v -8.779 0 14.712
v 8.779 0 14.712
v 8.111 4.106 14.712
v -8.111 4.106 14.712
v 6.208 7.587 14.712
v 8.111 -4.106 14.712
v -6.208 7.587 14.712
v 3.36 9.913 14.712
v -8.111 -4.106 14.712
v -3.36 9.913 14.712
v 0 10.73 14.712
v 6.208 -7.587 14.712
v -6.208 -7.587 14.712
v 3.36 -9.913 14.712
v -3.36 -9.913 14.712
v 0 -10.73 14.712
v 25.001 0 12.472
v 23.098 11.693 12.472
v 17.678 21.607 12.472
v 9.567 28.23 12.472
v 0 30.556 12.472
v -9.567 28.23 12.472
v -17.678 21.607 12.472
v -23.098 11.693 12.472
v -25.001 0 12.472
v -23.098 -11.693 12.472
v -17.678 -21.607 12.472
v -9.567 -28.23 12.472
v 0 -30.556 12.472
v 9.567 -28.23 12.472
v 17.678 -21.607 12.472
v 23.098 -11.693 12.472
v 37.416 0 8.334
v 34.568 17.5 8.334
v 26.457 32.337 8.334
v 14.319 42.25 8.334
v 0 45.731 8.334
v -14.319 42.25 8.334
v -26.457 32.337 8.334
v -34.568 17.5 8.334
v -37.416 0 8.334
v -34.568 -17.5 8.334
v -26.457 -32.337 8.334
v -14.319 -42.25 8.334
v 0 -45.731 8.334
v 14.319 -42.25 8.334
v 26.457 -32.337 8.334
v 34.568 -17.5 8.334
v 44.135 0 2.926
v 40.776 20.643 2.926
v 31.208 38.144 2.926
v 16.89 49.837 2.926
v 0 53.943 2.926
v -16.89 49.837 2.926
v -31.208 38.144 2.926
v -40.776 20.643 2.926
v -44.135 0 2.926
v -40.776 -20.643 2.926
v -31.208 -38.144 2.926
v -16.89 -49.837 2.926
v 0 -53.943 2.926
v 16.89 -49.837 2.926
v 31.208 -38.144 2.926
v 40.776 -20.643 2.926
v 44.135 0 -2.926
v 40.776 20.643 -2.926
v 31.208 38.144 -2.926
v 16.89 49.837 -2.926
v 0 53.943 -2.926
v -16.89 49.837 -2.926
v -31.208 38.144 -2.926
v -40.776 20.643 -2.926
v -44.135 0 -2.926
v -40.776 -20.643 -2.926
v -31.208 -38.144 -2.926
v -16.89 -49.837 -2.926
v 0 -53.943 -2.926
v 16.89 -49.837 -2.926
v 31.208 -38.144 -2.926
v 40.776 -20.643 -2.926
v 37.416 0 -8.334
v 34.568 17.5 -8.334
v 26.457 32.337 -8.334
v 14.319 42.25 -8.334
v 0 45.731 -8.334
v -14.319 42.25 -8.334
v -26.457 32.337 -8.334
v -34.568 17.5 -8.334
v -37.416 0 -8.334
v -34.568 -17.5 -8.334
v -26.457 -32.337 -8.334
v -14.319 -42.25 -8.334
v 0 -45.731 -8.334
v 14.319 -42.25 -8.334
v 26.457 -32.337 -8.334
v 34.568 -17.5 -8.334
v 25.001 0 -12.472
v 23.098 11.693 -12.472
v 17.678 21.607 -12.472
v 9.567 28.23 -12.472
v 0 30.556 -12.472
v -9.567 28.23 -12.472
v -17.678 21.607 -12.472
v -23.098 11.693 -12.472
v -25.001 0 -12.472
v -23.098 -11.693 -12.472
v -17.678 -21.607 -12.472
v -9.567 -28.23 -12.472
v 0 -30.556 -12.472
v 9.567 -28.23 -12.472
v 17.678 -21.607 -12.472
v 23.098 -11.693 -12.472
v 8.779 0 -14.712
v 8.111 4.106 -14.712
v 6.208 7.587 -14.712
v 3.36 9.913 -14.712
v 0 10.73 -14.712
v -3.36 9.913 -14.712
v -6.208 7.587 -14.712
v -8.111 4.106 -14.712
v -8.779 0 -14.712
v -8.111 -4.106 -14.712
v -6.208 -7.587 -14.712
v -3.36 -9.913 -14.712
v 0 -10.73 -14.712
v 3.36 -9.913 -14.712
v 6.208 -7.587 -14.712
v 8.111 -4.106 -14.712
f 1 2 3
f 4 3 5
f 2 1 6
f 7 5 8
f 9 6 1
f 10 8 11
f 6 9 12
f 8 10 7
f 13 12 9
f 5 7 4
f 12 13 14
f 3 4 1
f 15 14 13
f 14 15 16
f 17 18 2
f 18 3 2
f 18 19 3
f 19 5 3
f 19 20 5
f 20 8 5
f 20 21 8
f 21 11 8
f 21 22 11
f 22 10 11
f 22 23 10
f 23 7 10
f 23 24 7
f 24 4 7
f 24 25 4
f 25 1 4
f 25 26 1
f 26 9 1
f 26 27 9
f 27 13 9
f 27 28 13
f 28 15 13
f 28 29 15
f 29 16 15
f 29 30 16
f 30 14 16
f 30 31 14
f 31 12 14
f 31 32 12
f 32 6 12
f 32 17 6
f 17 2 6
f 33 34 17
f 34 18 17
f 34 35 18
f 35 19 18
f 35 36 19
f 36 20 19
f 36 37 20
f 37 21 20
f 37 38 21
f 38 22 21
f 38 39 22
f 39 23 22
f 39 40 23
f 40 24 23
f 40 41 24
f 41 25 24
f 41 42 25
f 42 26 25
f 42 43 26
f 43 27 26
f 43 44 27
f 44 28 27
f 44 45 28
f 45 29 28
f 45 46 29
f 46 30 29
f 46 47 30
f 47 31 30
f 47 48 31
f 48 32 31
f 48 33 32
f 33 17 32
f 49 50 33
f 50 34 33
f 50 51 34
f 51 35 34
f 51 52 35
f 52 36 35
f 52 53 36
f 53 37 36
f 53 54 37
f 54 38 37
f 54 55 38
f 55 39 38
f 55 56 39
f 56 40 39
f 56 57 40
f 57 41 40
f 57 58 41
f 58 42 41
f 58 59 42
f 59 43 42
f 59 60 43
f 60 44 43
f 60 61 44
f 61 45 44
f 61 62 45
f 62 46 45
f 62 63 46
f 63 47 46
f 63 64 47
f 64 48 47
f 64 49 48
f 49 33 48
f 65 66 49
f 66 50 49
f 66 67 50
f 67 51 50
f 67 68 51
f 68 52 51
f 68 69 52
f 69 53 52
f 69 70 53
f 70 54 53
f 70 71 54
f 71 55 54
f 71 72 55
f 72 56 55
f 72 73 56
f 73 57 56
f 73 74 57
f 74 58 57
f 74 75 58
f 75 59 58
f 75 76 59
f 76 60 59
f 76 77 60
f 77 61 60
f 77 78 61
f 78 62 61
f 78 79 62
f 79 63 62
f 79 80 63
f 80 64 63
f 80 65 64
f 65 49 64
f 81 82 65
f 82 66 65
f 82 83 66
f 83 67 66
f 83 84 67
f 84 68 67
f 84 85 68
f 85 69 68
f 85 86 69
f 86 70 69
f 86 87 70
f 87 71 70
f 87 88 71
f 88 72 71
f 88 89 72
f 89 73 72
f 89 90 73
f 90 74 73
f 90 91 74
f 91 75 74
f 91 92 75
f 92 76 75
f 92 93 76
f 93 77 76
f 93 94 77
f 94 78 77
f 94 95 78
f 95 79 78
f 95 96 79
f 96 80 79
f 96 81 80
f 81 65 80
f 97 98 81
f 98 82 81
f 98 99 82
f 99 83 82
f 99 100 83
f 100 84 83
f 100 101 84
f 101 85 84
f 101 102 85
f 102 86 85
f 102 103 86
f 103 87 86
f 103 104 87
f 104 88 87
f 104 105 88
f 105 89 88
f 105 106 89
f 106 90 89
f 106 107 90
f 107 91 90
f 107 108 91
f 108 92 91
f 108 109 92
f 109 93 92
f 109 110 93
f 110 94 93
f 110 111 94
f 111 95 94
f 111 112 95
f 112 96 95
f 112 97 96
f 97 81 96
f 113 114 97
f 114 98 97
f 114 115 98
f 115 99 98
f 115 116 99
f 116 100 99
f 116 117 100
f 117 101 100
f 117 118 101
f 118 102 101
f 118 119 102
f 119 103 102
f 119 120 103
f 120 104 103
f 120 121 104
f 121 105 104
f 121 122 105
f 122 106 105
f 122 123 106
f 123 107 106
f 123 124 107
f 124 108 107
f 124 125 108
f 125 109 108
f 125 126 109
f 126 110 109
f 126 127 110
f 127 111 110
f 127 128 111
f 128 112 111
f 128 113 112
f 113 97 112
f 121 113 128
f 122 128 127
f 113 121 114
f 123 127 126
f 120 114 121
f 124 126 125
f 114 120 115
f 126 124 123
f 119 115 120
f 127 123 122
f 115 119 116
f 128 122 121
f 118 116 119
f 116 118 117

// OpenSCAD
// Generated by SolidPython 1.0.1 on 2020-07-29 00:46:48


scale(v = [9, 11, 3]) {
	sphere(r = 5);
}
/***********************************************
*********      SolidPython code:      **********
************************************************
 
# import packages: SolidPython
from solid import *
from solid.utils import *
from itertools import chain, combinations, permutations


class Resize:

    def __init__(self, scad_file):
        self.scad_file = scad_file
        #self.scad_file = import_scad(scad_file)
        # cone/cylinder param:
        self.r1 = 0
        self.r2 = 0
        self.h = 0
        # rectangular prism param:
        self.w = 0
        self.l = 0
        # ellipse param:
        self.r = 0

    # import OpenScad code (file name corresponds to shape)


    # classify shape + parameters
    def assign(self, param1, param2, param3):
        if self.scad_file == 'cone.scad':
            self.r1 = param1
            self.r2 = param2
            self.h = param3
        elif self.scad_file == 'cylinder.scad':
            self.r1 = param1
            self.r2 = param2
            self.h = param3
        elif self.scad_file == 'rectangularPrism.scad':
            self.h = param1
            self.l = param2
            self.w = param3
        else:
            self.r = param1
            self.h = param2

    # resize parameters
    def iterate(self):
        x = range(3, 20, 2)
        i = 1
        if self.scad_file == 'cone.scad':
            tempList = list(permutations(x, 2))
            for temp in tempList:
                param1 = temp[0]
                param2 = temp[1]
                filepath = 'produced_scad_files/' + 'cone' + str(param1) + '_' + str(param2) + '_' + '.scad'
                scad_render_to_file(cylinder(h=param1, r1=param2, r2=0), filepath)

        elif self.scad_file == 'cylinder.scad':
            tempList = list(permutations(x, 3))
            for temp in tempList:
                param1 = temp[0]
                param2 = temp[1]
                filepath = 'produced_scad_files/' + 'cylinder' + str(param1) + '_' + str(param2) + '_' + '.scad'
                scad_render_to_file(cylinder(h=param1, r1=param2, r2=param2), filepath)

        elif self.scad_file == 'rectangularPrism.scad':
            tempList = list(permutations(x, 3))
            for temp in tempList:
                param1 = temp[0]
                param2 = temp[1]
                param3 = temp[2]
                filepath = 'produced_scad_files/' + 'rectangularPrism' + str(param1) + '_' + str(param2) + '_' + str(
                    param3) + '.scad'
                scad_render_to_file(cube(size=(param1, param2, param3)), filepath)

        elif self.scad_file == 'ellipse.scad':
            tempList = list(permutations(x, 4))
            for temp in tempList:
                param1 = temp[0]
                param2 = temp[1]
                param3 = temp[2]
                param4 = temp[3]
                filepath = 'produced_scad_files/' + 'ellipse' + str(param1) + '_' + str(param2) + '_' + str(param3) + '_' + str(param4) + '.scad'
                scad_render_to_file(scale([param1, param2, param3])(sphere(r=param4)), filepath)

    def render_to_scadfile(self):
        scad_render_to_file(scad, 'example.scad') 
 
************************************************/
